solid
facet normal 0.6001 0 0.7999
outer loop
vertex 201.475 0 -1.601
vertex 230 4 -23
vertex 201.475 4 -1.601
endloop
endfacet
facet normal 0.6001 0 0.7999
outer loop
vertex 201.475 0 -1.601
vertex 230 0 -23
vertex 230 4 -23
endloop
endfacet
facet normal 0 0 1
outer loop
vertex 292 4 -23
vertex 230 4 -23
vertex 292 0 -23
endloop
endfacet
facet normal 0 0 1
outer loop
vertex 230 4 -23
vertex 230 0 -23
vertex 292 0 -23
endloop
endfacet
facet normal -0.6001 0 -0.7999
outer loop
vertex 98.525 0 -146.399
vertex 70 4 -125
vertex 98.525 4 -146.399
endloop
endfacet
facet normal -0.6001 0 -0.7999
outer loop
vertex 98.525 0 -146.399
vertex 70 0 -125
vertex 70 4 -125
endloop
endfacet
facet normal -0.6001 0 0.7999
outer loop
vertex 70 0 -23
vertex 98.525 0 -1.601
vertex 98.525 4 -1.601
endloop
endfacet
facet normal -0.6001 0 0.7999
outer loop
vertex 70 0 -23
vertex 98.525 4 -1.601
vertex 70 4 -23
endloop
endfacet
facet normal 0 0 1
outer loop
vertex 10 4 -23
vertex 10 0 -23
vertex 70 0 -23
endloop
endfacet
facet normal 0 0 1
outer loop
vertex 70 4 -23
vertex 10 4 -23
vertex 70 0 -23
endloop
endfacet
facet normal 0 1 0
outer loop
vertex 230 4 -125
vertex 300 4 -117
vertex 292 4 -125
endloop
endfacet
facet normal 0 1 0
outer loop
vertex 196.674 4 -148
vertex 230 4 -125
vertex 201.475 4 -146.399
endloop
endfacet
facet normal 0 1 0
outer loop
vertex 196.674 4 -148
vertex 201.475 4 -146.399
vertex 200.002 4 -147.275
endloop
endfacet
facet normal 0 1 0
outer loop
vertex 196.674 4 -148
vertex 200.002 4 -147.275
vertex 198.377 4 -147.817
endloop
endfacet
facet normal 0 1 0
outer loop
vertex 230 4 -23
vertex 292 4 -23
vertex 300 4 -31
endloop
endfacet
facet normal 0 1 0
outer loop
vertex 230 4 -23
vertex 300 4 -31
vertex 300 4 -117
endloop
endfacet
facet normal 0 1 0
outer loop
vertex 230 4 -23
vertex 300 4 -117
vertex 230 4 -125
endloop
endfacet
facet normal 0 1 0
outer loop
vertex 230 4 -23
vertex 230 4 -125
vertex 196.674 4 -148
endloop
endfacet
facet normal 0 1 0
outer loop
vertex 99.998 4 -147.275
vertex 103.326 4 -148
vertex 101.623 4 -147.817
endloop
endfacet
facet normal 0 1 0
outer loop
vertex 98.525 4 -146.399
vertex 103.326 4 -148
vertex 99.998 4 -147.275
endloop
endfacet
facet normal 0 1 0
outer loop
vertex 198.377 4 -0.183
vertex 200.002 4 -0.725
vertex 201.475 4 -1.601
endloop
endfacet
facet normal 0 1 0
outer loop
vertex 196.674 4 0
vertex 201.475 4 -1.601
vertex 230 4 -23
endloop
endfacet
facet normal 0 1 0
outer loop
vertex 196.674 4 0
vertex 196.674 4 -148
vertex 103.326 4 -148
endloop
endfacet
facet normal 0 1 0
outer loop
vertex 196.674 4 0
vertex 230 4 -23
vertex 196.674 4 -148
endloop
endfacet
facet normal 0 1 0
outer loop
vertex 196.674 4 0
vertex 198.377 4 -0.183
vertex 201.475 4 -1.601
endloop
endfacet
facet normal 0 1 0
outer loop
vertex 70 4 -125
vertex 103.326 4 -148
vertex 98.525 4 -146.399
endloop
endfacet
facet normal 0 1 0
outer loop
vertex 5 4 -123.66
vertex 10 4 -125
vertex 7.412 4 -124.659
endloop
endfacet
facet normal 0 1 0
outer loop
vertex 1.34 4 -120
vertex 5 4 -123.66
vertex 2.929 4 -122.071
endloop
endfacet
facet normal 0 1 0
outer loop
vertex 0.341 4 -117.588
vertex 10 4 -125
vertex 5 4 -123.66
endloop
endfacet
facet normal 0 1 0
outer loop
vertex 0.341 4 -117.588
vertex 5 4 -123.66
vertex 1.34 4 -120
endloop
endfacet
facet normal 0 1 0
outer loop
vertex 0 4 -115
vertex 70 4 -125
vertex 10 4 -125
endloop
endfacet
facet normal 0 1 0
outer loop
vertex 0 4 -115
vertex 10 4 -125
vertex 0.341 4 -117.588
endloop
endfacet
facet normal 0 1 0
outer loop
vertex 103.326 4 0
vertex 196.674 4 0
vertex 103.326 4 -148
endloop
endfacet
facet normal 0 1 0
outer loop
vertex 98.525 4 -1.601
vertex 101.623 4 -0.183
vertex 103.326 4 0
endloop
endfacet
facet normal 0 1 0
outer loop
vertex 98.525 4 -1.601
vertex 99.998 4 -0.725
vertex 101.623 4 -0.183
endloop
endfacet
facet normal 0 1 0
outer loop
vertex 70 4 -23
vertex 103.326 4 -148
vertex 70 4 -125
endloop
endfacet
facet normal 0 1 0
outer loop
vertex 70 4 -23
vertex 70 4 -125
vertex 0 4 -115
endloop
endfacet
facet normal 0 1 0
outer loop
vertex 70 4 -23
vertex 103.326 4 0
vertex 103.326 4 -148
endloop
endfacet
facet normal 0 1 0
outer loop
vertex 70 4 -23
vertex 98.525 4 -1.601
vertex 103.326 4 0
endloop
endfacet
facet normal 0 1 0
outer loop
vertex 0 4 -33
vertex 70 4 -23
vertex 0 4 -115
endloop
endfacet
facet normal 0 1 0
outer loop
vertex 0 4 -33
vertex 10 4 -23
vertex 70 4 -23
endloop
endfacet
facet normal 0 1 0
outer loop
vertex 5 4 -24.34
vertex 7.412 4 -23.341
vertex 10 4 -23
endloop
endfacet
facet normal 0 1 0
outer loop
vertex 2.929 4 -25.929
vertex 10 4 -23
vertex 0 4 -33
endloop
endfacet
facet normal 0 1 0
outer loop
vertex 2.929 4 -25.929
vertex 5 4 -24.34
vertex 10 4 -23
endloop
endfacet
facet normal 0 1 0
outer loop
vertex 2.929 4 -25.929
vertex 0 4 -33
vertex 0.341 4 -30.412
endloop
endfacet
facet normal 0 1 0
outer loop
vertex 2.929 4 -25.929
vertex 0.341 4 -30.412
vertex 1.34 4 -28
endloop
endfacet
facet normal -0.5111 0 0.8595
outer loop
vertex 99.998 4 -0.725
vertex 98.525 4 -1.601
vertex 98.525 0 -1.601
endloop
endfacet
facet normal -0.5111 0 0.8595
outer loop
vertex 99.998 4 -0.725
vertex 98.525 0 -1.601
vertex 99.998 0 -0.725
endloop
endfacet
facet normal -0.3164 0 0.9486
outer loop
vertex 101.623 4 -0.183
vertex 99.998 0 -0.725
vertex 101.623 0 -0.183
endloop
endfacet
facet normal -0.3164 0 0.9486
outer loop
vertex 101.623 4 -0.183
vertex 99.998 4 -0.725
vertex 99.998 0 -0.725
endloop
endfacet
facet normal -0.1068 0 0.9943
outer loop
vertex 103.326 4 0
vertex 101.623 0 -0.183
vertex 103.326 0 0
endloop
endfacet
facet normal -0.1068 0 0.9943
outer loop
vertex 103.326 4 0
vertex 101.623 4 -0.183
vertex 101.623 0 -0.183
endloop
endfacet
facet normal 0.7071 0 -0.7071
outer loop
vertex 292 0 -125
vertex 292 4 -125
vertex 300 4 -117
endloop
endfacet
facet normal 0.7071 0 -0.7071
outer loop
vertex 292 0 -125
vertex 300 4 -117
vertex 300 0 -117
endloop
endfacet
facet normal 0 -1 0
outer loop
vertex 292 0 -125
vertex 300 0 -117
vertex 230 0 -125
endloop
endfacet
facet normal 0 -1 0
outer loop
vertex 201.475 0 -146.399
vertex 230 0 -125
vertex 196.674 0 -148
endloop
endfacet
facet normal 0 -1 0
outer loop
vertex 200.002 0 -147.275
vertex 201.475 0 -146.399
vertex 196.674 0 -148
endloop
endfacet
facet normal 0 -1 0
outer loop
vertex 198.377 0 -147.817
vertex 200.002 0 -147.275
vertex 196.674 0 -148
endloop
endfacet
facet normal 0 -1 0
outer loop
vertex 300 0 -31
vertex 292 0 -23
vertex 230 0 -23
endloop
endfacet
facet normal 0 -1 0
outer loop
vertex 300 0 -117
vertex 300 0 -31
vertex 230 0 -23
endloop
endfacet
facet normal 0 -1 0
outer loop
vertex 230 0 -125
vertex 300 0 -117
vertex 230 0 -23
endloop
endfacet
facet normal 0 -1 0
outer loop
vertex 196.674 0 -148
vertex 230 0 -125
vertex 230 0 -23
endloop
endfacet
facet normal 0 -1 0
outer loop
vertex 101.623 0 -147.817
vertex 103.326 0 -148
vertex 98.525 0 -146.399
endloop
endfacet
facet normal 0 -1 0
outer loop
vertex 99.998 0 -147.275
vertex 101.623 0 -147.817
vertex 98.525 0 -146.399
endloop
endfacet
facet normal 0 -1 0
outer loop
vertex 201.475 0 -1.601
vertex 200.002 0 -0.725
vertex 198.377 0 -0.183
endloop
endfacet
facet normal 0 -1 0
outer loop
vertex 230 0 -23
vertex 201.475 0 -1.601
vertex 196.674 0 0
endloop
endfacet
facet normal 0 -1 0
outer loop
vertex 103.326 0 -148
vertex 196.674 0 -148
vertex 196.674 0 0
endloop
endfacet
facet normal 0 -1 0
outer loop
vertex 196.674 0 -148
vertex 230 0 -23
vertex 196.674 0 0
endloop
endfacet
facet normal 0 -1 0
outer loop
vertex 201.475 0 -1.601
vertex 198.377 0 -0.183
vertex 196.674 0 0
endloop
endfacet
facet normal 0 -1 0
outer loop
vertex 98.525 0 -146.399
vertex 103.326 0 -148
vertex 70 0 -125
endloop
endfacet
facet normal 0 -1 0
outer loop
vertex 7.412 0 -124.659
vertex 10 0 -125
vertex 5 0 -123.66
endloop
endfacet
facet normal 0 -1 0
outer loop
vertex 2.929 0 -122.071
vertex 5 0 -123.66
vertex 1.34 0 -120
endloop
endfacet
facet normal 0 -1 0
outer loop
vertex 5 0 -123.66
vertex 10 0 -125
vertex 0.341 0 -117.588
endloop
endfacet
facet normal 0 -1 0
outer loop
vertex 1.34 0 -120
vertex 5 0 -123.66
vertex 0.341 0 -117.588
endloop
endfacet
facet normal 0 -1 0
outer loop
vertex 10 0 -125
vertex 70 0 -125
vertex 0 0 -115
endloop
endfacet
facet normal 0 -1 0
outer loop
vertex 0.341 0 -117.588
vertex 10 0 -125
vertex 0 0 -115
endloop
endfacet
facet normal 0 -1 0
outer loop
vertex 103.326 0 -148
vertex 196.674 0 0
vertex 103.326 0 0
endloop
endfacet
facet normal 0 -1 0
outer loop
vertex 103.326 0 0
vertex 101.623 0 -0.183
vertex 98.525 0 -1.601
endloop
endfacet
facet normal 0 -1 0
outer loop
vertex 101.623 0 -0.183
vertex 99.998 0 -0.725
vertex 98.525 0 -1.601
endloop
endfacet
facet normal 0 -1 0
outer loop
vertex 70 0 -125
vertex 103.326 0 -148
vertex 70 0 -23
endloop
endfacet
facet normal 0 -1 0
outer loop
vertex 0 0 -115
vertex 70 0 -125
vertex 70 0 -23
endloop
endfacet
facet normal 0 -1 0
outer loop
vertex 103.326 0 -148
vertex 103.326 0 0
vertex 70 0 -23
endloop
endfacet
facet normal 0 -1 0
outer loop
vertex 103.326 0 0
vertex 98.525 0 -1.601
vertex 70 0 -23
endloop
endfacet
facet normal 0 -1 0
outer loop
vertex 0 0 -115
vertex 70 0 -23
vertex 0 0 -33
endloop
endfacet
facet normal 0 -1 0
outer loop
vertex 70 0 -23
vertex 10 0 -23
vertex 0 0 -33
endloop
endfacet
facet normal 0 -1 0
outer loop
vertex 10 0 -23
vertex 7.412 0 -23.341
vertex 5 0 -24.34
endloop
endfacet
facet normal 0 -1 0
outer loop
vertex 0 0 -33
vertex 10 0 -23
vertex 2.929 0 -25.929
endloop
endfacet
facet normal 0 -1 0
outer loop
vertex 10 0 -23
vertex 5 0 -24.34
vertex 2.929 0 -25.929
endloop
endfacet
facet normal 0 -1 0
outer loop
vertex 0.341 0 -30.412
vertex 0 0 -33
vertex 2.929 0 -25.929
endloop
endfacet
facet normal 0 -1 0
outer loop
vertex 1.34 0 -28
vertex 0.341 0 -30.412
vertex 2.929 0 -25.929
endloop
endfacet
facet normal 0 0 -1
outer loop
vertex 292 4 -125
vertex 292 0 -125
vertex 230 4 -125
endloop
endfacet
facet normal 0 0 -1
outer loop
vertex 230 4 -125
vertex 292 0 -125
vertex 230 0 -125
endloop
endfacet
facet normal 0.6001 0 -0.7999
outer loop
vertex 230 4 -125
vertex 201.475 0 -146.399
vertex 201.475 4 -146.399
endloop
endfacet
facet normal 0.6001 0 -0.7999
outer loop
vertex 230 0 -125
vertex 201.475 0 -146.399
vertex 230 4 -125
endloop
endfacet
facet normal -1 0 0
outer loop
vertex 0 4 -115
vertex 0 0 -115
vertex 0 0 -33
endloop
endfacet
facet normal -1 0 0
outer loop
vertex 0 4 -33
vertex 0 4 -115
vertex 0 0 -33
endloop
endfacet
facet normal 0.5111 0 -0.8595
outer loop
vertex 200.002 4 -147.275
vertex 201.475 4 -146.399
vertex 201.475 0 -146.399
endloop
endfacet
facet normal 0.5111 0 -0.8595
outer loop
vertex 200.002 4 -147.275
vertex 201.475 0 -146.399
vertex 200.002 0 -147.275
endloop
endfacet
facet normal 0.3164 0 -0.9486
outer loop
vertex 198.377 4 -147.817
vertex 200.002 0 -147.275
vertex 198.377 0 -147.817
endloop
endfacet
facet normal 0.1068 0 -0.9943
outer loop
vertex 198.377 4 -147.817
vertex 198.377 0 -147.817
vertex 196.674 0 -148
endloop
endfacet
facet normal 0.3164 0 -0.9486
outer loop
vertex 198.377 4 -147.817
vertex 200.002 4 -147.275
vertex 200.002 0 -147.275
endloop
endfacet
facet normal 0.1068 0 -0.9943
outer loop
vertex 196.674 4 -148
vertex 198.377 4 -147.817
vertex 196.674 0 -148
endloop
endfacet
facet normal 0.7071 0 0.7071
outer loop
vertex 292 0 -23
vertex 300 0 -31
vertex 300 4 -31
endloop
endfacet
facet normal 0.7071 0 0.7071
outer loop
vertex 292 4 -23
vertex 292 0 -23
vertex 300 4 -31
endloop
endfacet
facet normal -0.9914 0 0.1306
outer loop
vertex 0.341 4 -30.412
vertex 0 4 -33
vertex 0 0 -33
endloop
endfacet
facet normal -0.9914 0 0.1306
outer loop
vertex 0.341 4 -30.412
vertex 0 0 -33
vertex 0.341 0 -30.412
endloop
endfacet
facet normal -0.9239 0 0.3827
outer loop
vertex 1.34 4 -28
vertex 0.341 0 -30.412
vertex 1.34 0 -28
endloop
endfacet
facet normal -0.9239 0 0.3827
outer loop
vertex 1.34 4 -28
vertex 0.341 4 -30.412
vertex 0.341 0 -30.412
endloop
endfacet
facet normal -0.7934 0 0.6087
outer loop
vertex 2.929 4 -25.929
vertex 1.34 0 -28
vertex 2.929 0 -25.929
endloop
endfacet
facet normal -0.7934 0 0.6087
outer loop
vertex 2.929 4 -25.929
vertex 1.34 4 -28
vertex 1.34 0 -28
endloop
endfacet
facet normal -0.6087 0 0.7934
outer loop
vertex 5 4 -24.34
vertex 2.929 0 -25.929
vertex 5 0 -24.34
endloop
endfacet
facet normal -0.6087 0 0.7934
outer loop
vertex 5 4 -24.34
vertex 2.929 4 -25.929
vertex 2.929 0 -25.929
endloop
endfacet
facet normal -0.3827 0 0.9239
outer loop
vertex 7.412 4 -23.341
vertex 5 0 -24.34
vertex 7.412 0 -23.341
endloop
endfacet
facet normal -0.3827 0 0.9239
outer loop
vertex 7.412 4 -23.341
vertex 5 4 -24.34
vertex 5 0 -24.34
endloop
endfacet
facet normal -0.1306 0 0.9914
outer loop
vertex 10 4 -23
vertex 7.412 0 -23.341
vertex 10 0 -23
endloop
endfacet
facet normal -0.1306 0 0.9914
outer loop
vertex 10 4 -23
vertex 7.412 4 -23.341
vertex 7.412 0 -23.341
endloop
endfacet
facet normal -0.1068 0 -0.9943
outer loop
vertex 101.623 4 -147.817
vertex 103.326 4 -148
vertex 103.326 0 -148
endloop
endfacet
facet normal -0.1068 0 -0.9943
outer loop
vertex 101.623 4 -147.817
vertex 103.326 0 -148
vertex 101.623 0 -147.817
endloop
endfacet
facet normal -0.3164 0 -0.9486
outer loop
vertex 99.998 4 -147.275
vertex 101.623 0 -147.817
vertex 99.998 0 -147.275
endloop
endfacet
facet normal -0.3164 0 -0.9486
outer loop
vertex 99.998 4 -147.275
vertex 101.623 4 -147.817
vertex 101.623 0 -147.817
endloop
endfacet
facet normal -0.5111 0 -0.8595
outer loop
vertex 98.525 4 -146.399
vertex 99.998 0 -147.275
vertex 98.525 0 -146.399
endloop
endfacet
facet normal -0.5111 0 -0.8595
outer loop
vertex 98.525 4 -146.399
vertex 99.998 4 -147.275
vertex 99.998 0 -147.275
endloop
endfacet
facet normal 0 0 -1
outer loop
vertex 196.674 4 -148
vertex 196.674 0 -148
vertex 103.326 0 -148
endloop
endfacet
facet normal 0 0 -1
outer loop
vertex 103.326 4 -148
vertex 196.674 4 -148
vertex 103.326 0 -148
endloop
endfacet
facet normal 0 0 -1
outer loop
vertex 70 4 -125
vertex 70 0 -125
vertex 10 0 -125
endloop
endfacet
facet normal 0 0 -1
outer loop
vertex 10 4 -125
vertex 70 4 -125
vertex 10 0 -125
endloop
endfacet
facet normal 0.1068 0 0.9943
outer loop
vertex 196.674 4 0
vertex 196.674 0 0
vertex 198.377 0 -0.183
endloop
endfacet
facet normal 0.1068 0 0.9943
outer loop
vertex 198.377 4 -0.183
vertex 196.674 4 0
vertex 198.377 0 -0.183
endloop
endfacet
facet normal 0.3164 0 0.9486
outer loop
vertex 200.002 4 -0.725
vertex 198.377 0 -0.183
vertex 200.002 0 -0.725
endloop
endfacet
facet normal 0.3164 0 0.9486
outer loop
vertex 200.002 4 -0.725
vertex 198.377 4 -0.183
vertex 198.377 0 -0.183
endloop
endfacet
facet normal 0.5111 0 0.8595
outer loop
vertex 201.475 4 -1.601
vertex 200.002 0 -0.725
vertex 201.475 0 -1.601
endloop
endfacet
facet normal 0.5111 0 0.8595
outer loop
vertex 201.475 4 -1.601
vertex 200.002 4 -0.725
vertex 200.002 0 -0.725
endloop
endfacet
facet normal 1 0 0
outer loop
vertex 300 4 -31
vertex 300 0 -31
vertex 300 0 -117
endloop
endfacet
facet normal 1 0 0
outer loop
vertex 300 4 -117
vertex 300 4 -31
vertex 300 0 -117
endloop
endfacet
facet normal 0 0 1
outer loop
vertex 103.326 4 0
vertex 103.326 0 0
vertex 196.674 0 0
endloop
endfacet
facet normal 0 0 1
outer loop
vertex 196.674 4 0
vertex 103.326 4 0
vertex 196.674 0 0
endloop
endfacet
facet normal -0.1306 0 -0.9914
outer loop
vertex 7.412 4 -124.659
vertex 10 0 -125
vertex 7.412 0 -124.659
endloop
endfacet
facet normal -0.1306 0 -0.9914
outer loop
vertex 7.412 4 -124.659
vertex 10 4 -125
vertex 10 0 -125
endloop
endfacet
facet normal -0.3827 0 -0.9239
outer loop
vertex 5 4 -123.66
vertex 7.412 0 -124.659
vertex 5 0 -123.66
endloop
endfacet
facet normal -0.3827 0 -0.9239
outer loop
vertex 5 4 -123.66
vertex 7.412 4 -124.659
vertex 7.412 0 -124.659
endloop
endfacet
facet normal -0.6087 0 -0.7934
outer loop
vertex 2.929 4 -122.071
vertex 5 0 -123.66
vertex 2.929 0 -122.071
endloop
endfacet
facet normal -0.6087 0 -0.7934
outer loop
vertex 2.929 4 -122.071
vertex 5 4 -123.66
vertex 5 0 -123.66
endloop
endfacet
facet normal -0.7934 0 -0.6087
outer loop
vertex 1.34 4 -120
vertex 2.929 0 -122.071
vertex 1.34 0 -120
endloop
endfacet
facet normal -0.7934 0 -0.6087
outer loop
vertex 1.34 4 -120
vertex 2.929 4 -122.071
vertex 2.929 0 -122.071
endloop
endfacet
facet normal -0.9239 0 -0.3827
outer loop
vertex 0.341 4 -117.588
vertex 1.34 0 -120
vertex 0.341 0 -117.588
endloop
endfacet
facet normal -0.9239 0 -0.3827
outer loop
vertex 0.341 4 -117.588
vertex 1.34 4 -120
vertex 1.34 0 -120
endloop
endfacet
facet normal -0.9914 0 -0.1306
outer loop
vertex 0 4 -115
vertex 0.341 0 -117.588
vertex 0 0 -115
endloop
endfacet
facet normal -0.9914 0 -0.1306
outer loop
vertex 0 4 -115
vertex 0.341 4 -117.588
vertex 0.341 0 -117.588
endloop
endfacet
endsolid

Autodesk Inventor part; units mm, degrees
sketch "Sketch1" plane through (0, 0, 0) normal (0, 1, 0) x (-1, 0, 0)
  line L0 (0, 0) -> (-300, 0)
  line L1 (-300, 0) -> (-300, -148)
  line L2 (-300, -148) -> (0, -148)
  line L3 (0, -148) -> (0, 0)
  dimension "d0" = 300
  dimension "d1" = 148
extrude "Extrusion1" add sketch "Sketch1" along normal blind 4
sketch "Sketch2" plane through (0, 0, 0) normal (0, -1, 0) x (1, 0, 0)
  line L0 (0, -74) -> (300, -74) construction
  line L1 (150, 0) -> (150, -148) construction
sketch "Sketch3" plane through (0, 0, 0) normal (0, -1, 0) x (1, 0, 0)
  line L0 (0, -148) -> (70, -148)
  line L1 (70, -148) -> (70, -125)
  line L2 (70, -125) -> (0, -125)
  line L3 (0, -125) -> (0, -148)
  point P0 (0, 0)
  dimension "d4" = 70
  dimension "d5" = 23
extrude "Extrusion2" cut sketch "Sketch3" against normal blind 10
fillet "Fillet1" radius 10 1 edges at (0, 2, -125)
sketch "Sketch4" plane through (0, 0, 0) normal (0, -1, 0) x (1, 0, 0)
  line L0 (70, -125) -> (100.659, -148)
  line L1 (300, -148) -> (70, -148) projected
  line L2 (70, -148) -> (70, -125)
  line L3 (70, -125) -> (70, -148) projected
  point P0 (0, 0)
extrude "Extrusion3" cut sketch "Sketch4" against normal blind 10
ref_plane "Work Plane1" through (150, 0, 0) normal (1, 0, 0) x (0, 0, -1)
ref_plane "Work Plane2" through (100.659, 0, -74) normal (0, 0, -1) x (-1, 0, 0)
mirror "Mirror2" about plane through (100.659, 0, -74) normal (0, 0, -1) of "Extrusion2", "Extrusion3"
fillet "Fillet2" radius 10 1 edges at (0, 2, -23)
sketch "Sketch6" plane through (0, 0, 0) normal (0, -1, 0) x (1, 0, 0)
  point P0 (0, 0)
ref_plane "Work Plane3" through (150, 0, 0) normal (1, 0, 0) x (0, 0, -1)
mirror "Mirror3" about plane through (150, 0, 0) normal (1, 0, 0) of "Extrusion2", "Extrusion3", "Mirror2"
chamfer "Chamfer1" distance 8 angle 45 2 edges at (300, 2, -23) (300, 2, -125)
fillet "Fillet3" radius 8 4 edges at (199.341, 2, 0) (100.659, 2, 0) (199.341, 2, -148) (100.659, 2, -148)
sketch "Sketch7" plane through (0, 4, 0) normal (0, 1, 0) x (1, 0, 0)
  point P0 (0, 0)
properties part number "Basetrimed" material "ABS Plastic"
